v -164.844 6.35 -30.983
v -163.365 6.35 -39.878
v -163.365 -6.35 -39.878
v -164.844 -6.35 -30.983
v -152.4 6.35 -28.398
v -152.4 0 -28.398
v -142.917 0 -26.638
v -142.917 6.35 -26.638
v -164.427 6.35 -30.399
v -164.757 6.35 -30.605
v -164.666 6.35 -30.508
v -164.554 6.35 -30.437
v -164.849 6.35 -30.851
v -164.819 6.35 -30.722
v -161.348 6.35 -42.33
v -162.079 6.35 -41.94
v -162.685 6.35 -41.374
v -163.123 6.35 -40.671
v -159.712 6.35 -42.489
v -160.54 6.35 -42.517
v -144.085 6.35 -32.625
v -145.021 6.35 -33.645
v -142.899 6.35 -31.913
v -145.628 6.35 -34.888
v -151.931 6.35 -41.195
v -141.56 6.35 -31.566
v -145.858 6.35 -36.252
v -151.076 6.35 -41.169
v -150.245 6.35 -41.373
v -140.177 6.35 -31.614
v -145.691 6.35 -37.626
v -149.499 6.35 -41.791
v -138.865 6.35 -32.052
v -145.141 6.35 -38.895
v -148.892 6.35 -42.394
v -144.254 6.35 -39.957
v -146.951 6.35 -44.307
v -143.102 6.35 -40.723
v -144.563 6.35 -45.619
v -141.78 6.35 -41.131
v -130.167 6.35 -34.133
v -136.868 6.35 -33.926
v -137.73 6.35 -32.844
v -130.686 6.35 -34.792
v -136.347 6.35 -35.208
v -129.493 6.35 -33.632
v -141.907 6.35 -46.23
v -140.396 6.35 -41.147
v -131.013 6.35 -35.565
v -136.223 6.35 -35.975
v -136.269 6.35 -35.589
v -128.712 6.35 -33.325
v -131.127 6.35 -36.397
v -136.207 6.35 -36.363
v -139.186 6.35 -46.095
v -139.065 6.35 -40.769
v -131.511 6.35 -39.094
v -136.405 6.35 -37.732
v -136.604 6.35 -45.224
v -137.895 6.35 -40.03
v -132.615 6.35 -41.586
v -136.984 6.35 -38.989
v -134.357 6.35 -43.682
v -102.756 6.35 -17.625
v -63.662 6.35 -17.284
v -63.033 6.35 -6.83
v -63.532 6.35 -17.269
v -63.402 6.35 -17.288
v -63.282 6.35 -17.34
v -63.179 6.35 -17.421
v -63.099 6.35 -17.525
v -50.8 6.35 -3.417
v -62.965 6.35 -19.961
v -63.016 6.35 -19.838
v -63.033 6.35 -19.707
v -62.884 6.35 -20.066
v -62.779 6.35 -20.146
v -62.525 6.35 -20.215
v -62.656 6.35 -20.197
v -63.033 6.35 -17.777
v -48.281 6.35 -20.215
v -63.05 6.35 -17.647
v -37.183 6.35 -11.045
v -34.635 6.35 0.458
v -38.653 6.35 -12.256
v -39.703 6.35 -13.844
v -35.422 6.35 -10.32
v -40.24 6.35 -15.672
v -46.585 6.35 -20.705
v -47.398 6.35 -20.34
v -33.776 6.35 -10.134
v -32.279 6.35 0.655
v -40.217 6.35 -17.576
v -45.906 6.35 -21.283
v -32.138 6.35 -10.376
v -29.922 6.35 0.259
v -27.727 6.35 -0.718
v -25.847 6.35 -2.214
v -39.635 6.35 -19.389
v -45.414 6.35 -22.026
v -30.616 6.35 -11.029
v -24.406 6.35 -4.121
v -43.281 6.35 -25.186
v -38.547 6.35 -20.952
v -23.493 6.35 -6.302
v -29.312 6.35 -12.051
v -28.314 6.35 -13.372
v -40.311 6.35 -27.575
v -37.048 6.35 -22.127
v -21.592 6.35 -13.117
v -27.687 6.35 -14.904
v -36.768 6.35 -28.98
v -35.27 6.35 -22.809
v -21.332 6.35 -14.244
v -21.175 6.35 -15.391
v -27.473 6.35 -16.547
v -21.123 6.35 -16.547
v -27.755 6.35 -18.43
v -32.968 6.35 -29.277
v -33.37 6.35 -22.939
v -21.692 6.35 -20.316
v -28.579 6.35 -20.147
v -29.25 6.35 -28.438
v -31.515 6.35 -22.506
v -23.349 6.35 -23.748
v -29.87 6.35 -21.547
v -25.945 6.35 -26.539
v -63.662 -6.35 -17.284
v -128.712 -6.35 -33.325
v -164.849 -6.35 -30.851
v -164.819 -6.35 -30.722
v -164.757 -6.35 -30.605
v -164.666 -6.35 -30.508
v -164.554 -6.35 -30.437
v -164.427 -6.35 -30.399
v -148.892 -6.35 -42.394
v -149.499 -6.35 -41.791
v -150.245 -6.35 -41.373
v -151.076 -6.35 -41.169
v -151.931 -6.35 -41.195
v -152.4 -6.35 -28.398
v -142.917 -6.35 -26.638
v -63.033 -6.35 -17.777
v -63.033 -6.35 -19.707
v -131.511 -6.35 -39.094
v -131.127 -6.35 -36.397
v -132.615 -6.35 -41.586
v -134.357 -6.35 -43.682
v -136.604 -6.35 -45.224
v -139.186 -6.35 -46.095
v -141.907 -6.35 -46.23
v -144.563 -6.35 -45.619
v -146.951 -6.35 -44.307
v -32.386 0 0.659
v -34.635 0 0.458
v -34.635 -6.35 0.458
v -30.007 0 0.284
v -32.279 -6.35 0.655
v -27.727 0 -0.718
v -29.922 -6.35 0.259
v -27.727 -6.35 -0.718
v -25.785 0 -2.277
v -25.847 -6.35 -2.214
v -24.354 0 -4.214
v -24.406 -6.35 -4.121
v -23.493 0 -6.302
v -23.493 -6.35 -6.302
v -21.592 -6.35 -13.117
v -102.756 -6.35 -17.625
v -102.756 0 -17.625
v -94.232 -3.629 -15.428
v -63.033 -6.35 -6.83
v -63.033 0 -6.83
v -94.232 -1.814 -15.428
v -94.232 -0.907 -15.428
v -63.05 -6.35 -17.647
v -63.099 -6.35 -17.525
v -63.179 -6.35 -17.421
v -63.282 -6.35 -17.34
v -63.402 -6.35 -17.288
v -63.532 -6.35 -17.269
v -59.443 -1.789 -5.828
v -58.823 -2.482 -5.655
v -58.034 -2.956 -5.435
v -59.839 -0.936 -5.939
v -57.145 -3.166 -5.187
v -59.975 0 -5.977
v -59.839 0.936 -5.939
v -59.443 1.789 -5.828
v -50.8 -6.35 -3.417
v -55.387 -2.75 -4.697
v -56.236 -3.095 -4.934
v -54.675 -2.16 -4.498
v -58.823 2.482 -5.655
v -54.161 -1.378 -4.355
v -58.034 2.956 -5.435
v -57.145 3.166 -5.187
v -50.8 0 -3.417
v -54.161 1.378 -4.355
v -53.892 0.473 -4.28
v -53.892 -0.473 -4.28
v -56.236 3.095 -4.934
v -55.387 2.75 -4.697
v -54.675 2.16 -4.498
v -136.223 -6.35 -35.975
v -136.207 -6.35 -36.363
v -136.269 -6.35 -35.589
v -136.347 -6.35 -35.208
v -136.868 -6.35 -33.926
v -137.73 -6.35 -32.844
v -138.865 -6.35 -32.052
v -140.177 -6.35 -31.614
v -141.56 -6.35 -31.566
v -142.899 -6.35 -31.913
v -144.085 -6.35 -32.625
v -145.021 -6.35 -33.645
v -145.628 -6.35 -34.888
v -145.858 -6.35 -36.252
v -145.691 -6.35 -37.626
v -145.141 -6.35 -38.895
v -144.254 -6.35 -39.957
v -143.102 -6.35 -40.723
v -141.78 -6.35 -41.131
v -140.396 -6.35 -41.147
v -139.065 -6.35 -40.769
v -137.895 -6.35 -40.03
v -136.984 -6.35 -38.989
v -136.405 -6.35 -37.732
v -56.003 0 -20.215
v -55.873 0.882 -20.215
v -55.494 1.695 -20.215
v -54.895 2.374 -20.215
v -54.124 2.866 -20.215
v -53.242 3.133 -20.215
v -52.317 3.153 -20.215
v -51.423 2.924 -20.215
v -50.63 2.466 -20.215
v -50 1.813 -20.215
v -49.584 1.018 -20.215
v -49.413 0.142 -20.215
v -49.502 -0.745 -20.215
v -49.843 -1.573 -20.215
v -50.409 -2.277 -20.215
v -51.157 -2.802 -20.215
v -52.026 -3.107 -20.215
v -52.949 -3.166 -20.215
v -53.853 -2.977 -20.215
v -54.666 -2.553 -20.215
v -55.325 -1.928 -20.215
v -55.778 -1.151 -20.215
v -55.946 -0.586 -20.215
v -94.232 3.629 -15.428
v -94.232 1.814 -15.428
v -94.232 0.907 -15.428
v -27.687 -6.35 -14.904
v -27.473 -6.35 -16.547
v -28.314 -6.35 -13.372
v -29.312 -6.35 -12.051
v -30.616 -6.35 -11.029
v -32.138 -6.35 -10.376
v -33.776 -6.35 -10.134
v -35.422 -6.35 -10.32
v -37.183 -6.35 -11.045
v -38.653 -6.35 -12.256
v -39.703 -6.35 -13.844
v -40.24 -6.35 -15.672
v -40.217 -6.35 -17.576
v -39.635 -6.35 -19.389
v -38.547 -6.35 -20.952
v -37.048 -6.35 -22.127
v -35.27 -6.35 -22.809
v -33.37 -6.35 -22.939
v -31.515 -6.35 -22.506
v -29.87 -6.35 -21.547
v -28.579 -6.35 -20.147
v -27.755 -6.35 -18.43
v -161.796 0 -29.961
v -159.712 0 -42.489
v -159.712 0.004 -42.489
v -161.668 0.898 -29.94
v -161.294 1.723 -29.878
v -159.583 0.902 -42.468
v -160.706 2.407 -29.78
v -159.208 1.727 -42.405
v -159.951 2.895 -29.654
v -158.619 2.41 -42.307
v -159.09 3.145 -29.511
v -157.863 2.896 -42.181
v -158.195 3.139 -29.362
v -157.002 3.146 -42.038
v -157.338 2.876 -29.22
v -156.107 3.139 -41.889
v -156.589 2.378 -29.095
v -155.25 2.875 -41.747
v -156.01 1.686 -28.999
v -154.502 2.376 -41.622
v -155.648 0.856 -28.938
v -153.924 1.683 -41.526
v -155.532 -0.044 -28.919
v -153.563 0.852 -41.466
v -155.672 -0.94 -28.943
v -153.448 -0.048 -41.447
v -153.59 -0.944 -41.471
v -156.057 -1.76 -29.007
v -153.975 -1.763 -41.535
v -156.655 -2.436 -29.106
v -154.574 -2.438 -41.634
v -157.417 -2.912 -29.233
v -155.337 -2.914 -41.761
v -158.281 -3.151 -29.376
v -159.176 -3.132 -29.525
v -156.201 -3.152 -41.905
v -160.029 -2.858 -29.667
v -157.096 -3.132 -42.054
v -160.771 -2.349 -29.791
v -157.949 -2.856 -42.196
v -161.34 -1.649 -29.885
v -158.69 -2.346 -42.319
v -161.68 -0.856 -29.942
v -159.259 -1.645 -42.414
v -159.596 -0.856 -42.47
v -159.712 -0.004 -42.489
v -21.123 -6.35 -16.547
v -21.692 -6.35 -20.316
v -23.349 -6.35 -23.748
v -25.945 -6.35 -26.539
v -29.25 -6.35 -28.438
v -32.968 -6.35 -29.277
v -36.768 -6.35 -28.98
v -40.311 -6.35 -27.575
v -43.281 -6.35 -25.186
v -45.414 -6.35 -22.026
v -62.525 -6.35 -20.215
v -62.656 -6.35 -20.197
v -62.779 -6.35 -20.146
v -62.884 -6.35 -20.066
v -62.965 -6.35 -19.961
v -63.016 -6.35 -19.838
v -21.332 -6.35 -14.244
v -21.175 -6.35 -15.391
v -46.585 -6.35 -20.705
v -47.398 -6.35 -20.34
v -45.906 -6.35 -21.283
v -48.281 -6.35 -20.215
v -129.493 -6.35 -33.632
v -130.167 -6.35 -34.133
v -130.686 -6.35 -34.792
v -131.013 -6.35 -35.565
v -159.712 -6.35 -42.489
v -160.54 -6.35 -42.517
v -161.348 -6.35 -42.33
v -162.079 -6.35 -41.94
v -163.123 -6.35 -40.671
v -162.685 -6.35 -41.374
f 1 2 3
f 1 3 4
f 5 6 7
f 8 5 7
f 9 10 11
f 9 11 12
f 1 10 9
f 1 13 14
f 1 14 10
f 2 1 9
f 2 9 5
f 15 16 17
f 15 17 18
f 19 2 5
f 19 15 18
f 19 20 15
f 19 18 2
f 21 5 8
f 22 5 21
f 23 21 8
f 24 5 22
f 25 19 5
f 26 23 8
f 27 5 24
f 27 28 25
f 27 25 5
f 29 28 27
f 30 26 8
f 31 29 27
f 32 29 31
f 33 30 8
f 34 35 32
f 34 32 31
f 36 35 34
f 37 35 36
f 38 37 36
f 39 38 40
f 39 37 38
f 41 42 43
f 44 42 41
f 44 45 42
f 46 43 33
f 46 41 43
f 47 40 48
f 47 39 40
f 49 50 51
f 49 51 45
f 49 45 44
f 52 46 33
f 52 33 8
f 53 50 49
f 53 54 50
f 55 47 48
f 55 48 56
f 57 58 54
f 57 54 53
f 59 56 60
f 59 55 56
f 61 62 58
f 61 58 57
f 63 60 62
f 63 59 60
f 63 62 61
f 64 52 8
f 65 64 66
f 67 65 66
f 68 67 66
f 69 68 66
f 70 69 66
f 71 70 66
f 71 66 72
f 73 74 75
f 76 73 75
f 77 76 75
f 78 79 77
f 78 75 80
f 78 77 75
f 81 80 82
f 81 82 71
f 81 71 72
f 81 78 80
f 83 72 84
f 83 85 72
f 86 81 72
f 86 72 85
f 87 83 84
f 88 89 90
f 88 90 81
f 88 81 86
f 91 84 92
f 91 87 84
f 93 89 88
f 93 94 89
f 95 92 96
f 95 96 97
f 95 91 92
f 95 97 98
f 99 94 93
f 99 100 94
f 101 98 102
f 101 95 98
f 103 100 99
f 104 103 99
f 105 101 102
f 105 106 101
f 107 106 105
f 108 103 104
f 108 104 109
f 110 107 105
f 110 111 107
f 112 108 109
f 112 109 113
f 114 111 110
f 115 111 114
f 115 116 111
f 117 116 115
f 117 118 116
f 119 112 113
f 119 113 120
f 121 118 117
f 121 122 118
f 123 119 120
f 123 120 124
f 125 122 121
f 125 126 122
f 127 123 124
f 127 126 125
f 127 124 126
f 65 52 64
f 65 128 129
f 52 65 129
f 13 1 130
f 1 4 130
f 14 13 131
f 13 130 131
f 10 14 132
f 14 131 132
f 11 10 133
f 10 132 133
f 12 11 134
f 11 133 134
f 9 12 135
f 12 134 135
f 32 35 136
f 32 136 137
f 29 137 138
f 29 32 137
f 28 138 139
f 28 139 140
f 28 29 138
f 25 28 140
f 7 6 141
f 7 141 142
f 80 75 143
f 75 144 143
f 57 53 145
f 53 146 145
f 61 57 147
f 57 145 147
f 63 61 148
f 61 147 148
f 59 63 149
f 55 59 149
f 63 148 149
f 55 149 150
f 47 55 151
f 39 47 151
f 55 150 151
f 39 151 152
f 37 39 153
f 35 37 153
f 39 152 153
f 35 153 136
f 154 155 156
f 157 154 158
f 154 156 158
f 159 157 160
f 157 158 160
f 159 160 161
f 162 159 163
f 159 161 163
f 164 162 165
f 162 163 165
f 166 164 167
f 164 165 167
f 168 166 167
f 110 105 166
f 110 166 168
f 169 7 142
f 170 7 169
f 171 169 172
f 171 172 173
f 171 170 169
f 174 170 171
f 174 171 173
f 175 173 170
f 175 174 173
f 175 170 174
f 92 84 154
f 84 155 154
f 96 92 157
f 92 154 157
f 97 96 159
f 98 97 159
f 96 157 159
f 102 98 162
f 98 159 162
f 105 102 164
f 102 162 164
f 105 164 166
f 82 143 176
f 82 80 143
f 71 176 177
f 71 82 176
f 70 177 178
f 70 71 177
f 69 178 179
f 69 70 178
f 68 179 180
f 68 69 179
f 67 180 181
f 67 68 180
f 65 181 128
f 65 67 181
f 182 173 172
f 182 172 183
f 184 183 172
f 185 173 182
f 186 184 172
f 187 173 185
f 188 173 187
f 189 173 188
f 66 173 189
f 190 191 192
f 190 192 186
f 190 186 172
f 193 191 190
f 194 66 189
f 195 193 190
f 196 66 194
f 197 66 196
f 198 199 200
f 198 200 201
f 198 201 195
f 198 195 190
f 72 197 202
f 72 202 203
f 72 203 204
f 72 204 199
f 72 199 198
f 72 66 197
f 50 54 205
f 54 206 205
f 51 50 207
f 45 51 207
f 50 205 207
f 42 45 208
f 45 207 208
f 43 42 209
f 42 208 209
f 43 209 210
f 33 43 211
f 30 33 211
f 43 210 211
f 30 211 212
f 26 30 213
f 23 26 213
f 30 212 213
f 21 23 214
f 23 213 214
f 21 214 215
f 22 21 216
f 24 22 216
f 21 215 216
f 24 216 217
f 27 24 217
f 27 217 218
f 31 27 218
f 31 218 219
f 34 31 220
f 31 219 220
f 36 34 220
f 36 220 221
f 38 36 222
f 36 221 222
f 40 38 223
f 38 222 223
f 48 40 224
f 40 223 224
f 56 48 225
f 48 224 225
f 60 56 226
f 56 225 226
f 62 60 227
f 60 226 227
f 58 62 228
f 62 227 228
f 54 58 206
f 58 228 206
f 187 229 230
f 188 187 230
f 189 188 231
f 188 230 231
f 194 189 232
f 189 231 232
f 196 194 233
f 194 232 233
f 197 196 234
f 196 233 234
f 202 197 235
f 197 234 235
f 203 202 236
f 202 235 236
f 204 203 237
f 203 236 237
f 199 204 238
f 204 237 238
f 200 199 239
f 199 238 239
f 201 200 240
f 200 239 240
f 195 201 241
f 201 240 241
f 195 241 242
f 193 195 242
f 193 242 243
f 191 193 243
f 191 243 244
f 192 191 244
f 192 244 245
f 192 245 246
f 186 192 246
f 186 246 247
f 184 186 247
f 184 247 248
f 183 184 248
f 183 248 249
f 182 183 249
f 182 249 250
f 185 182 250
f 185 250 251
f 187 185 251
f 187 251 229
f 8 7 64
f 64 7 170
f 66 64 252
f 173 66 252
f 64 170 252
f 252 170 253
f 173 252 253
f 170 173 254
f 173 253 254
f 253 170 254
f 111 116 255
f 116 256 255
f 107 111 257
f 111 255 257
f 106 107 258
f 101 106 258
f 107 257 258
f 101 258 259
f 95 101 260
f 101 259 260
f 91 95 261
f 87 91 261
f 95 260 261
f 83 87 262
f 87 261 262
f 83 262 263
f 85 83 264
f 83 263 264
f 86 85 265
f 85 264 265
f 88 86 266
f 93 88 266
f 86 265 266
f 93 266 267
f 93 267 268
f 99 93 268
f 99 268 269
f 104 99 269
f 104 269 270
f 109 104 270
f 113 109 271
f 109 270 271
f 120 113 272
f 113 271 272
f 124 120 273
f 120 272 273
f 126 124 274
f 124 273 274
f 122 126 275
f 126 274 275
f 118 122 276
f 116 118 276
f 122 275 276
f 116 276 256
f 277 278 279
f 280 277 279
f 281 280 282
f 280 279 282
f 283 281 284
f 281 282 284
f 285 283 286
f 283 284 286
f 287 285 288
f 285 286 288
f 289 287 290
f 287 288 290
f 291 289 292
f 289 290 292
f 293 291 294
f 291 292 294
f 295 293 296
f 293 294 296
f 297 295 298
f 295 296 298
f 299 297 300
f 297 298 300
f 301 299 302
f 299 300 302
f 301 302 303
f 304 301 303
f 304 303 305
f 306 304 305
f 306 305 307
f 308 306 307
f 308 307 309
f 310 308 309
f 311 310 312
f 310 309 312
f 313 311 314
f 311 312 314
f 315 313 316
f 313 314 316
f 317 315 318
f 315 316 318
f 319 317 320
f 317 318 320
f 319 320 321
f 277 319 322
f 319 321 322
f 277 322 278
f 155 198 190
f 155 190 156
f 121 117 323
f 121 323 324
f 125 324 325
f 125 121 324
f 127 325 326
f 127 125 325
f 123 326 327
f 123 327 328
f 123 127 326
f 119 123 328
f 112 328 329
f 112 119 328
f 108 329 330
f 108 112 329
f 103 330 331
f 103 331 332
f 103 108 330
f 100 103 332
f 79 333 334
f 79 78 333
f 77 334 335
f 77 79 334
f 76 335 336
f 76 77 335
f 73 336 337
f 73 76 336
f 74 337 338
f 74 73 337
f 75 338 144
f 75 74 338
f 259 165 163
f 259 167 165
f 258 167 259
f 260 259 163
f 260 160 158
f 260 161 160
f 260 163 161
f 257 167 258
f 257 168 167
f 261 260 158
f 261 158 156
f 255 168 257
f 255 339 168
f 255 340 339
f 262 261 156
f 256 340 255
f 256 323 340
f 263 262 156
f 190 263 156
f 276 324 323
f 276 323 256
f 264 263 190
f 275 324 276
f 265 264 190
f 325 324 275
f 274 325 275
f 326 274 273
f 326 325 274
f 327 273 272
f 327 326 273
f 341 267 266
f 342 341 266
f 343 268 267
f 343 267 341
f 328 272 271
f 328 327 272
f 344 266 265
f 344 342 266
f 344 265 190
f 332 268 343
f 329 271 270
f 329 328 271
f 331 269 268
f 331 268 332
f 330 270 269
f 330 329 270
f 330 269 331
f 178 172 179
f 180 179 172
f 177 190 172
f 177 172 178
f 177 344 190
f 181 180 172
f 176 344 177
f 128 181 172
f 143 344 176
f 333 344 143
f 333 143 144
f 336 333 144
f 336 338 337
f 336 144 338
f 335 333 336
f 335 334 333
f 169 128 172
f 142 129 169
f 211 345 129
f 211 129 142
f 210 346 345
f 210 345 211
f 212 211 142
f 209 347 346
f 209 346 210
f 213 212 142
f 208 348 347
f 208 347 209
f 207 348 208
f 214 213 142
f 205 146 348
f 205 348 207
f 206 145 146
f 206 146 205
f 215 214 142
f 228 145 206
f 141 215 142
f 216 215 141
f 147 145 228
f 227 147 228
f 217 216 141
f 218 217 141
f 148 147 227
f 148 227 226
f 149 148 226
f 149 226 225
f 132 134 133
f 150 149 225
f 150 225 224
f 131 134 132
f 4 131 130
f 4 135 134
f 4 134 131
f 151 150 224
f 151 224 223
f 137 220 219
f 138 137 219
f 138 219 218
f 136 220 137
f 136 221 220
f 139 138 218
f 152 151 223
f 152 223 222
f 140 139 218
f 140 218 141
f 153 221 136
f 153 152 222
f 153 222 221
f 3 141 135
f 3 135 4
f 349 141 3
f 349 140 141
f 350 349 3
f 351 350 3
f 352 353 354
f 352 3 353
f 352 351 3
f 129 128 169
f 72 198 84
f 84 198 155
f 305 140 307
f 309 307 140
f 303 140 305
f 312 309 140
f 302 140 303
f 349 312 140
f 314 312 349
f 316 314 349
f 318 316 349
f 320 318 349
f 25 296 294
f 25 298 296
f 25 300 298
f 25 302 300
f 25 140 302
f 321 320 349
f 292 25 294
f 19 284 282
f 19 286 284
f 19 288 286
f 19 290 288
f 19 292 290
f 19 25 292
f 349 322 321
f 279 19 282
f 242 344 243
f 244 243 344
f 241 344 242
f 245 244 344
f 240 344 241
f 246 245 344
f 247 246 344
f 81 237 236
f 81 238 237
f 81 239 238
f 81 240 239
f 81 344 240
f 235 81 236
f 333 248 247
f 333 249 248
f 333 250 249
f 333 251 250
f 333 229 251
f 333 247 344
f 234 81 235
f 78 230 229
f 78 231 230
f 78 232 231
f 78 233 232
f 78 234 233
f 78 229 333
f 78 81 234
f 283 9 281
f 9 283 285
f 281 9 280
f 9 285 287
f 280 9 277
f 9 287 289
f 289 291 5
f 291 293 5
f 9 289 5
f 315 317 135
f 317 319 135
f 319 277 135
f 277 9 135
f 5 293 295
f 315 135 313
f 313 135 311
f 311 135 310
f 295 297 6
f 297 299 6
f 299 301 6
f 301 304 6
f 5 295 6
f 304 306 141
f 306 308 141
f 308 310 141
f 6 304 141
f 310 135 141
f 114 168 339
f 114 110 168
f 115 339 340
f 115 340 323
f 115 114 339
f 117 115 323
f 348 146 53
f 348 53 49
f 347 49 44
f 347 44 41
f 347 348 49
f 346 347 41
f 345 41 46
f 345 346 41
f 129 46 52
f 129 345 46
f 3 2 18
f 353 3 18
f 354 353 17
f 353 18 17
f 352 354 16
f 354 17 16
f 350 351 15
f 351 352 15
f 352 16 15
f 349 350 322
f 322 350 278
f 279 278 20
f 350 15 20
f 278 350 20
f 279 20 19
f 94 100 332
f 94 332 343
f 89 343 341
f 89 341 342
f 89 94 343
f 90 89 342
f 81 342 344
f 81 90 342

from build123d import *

# Parameters (mm, degrees)
BOSS_EXTRUDE1_DEPTH                   = 6.35
FILLET1_R                             = 3.175
FILLET4_R                             = 0.508
F_1_4_0_25_DIAMETER_HOLE1_D           = 6.35
F_1_4_0_25_DIAMETER_HOLE1_ON_FACE_2_D = 6.35
FILLET8_R                             = 9.525


with BuildPart() as part:
    # Sketch1 → Boss-Extrude1 (new, symmetric)
    # profile 1 of 13: a face of its own
    with BuildSketch(Plane(origin=(0, 0, 0), x_dir=(1, 0, 0), z_dir=(0, 1, 0))):
        Polygon((-63.032869919, 6.829847883), (-50.8, 3.417093343), (-50.117449092, 5.863667327), (-48.008399772, 13.423462702), (-63.032869919, 17.128450878), align=None)
    # profile 2 of 13: a face of its own
    with BuildSketch(Plane(origin=(0, 0, 0), x_dir=(1, 0, 0), z_dir=(0, 1, 0))):
        with BuildLine():
            Line((-50.117449092, 5.863667327), (-50.8, 3.417093343))
            add(Edge.make_bspline(
                [(-50.8, 3.417093343), (-47.90401251, 2.638759622), (-42.323161066, 1.207315918), (-34.243320379, -0.564459364), (-28.828072067, -1.650873486), (-26.114874946, -2.164171794), (-25.868230414, -2.21056185)],
                knots=[0.402881469, 0.402881469, 0.402881469, 0.402881469, 0.417195876, 0.430379519, 0.442362633, 0.443560626, 0.443560626, 0.443560626, 0.443560626], degree=3))
            Line((-25.868230414, -2.21056185), (-25.529380555, -0.995969297))
            Line((-25.529380555, -0.995969297), (-50.117449092, 5.863667327))
        make_face()
    # profile 3 of 13: a face of its own
    with BuildSketch(Plane(origin=(0, 0, 0), x_dir=(1, 0, 0), z_dir=(0, 1, 0))):
        with BuildLine():
            add(Edge.make_bspline(
                [(-142.916964795, 26.637840254), (-139.851770269, 26.044031657), (-132.224118107, 24.507766264), (-120.204077857, 21.875031645), (-107.039843971, 18.731571582), (-94.42881917, 15.508074422), (-82.464130524, 12.283599717), (-72.07374601, 9.383281264), (-65.6770572, 7.577167824), (-63.032869919, 6.829847883)],
                knots=[0.2516695, 0.2516695, 0.2516695, 0.2516695, 0.266573311, 0.288810349, 0.310405036, 0.331177743, 0.350943876, 0.3695564, 0.382673151, 0.382673151, 0.382673151, 0.382673151], degree=3))
            Line((-63.032869919, 6.829847883), (-63.032869919, 17.128450878))
            Line((-63.032869919, 17.128450878), (-131.41505653, 33.991287994))
            ThreePointArc((-131.41505653, 33.991287994), (-135.697076354, 28.016927932), (-142.916964795, 26.637840254))
        make_face()
    # profile 4 of 13: a face of its own
    with BuildSketch(Plane(origin=(0, 0, 0), x_dir=(1, 0, 0), z_dir=(0, 1, 0))):
        with BuildLine():
            Line((-48.008399772, 13.423462702), (-50.117449092, 5.863667327))
            Line((-50.117449092, 5.863667327), (-25.529380555, -0.995969297))
            Line((-25.529380555, -0.995969297), (-21.592172885, 13.116780012))
            ThreePointArc((-21.592172885, 13.116780012), (-33.805570634, 3.783353047), (-46.135923457, 12.961715796))
            Line((-46.135923457, 12.961715796), (-48.008399772, 13.423462702))
        make_face()
    # profile 5 of 13: a face of its own
    with BuildSketch(Plane(origin=(0, 0, 0), x_dir=(1, 0, 0), z_dir=(0, 1, 0))):
        Polygon((-63.032869919, 20.214556587), (-63.032869919, 17.128450878), (-48.008399772, 13.423462702), (-46.180241275, 19.976417164), (-46.113804584, 20.214556587), align=None)
    # profile 6 of 13: a face of its own
    with BuildSketch(Plane(origin=(0, 0, 0), x_dir=(1, 0, 0), z_dir=(0, 1, 0))):
        with BuildLine():
            add(Edge.make_bspline(
                [(-152.4, 28.398178215), (-150.835767653, 28.120675984), (-147.672379647, 27.546477658), (-144.513670254, 26.947163992), (-142.916964795, 26.637840254)],
                knots=[0.236322429, 0.236322429, 0.236322429, 0.236322429, 0.243905882, 0.2516695, 0.2516695, 0.2516695, 0.2516695], degree=3))
            ThreePointArc((-142.916964795, 26.637840254), (-149.167660925, 30.710139705), (-150.804662589, 37.988535853))
            Line((-150.804662589, 37.988535853), (-152.4, 28.398178215))
        make_face()
    # profile 7 of 13: a face of its own
    with BuildSketch(Plane(origin=(0, 0, 0), x_dir=(1, 0, 0), z_dir=(0, 1, 0))):
        with BuildLine():
            ThreePointArc((-150.804662589, 37.988535853), (-149.167660925, 30.710139705), (-142.916964795, 26.637840254))
            ThreePointArc((-142.916964795, 26.637840254), (-135.697076354, 28.016927932), (-131.41505653, 33.991287994))
            ThreePointArc((-131.41505653, 33.991287994), (-131.199232943, 35.168440277), (-131.126940024, 36.363028513))
            ThreePointArc((-131.126940024, 36.363028513), (-138.72556699, 45.996556718), (-149.864041918, 40.850842606))
            ThreePointArc((-149.864041918, 40.850842606), (-150.443809774, 39.45565952), (-150.804662589, 37.988535853))
        make_face()
        with BuildLine():
            ThreePointArc((-136.206940024, 36.363028513), (-136.242159651, 35.781049629), (-136.347304475, 35.207565183))
            ThreePointArc((-136.347304475, 35.207565183), (-145.823720397, 36.945007397), (-136.206940024, 36.363028513))
        make_face(mode=Mode.SUBTRACT)
    # profile 8 of 13: a face of its own
    with BuildSketch(Plane(origin=(0, 0, 0), x_dir=(1, 0, 0), z_dir=(0, 1, 0))):
        with BuildLine():
            Line((-46.180241275, 19.976417164), (-48.008399772, 13.423462702))
            Line((-48.008399772, 13.423462702), (-46.135923457, 12.961715796))
            ThreePointArc((-46.135923457, 12.961715796), (-46.649452433, 16.465962078), (-46.180241275, 19.976417164))
        make_face()
    # profile 9 of 13: a face of its own
    with BuildSketch(Plane(origin=(0, 0, 0), x_dir=(1, 0, 0), z_dir=(0, 1, 0))):
        with BuildLine():
            Line((-152.4, 28.398178215), (-150.804662589, 37.988535853))
            Line((-150.804662589, 37.988535853), (-150.316016511, 40.926027704))
            Line((-150.316016511, 40.926027704), (-162.843866, 43.010011192))
            Line((-162.843866, 43.010011192), (-164.927849489, 30.482161703))
            add(Edge.make_bspline(
                [(-164.927849489, 30.482161703), (-163.914067431, 30.324847033), (-159.732455899, 29.664434578), (-155.558182899, 28.958454826), (-152.4, 28.398178215)],
                knots=[0.216114261, 0.216114261, 0.216114261, 0.216114261, 0.221011446, 0.236322429, 0.236322429, 0.236322429, 0.236322429], degree=3))
        make_face()
    # profile 10 of 13: a face of its own
    with BuildSketch(Plane(origin=(0, 0, 0), x_dir=(1, 0, 0), z_dir=(0, 1, 0))):
        with BuildLine():
            Line((-150.316016511, 40.926027704), (-150.804662589, 37.988535853))
            ThreePointArc((-150.804662589, 37.988535853), (-150.443809774, 39.45565952), (-149.864041918, 40.850842606))
            Line((-149.864041918, 40.850842606), (-150.316016511, 40.926027704))
        make_face()
    # profile 11 of 13: a face of its own
    with BuildSketch(Plane(origin=(0, 0, 0), x_dir=(1, 0, 0), z_dir=(0, 1, 0))):
        with BuildLine():
            Line((-164.927849489, 30.482161703), (-152.4, 28.398178215))
            add(Edge.make_bspline(
                [(-164.927849489, 30.482161703), (-163.914067431, 30.324847033), (-159.732455899, 29.664434578), (-155.558182899, 28.958454826), (-152.4, 28.398178215)],
                knots=[0.216114261, 0.216114261, 0.216114261, 0.216114261, 0.221011446, 0.236322429, 0.236322429, 0.236322429, 0.236322429], degree=3))
        make_face()
    # profile 12 of 13: a face of its own
    with BuildSketch(Plane(origin=(0, 0, 0), x_dir=(1, 0, 0), z_dir=(0, 1, 0))):
        with BuildLine():
            Line((-46.113804584, 20.214556587), (-46.180241275, 19.976417164))
            ThreePointArc((-46.180241275, 19.976417164), (-46.14635129, 20.095654256), (-46.111304881, 20.214556587))
            Line((-46.111304881, 20.214556587), (-46.113804584, 20.214556587))
        make_face()
    # profile 13 of 13: a face of its own
    with BuildSketch(Plane(origin=(0, 0, 0), x_dir=(1, 0, 0), z_dir=(0, 1, 0))):
        with BuildLine():
            ThreePointArc((-46.111304881, 20.214556587), (-46.14635129, 20.095654256), (-46.180241275, 19.976417164))
            ThreePointArc((-46.180241275, 19.976417164), (-46.649452433, 16.465962078), (-46.135923457, 12.961715796))
            ThreePointArc((-46.135923457, 12.961715796), (-33.805570634, 3.783353047), (-21.592172885, 13.116780012))
            ThreePointArc((-21.592172885, 13.116780012), (-21.240618227, 14.815698867), (-21.122707154, 16.546598324))
            ThreePointArc((-21.122707154, 16.546598324), (-32.032575932, 29.17478044), (-46.111304881, 20.214556587))
        make_face()
        with BuildLine():
            ThreePointArc((-27.472707154, 16.546598324), (-29.931164004, 11.497775102), (-35.421757105, 10.319635293))
            ThreePointArc((-35.421757105, 10.319635293), (-37.841250304, 21.595421547), (-27.472707154, 16.546598324))
        make_face(mode=Mode.SUBTRACT)
    extrude(amount=BOSS_EXTRUDE1_DEPTH, both=True)

    # Fillet1
    # the kernel refuses this fillet: 3.175 mm, written as the material it adds along each edge
    with BuildSketch(Plane(origin=(-149.864041918, 6.35, -40.850842606), x_dir=(0.5331827682272952, 0, -0.8460000801805391), z_dir=(0, -1, 0))) as fillet1_piece_1:
        with BuildLine():
            CenterArc((2.116076272, -3.161518606), FILLET1_R, 95.281860793, 61.941944222)
            Line((-0.811350167, -1.932372788), (0, 0))
            ThreePointArc((0, 0), (0.911900272, -0.042061948), (1.823800544, 0))
        make_face()
    extrude(amount=12.7)
    with BuildSketch(Plane(origin=(-131.41505653, -6.35, -33.991287994), x_dir=(0.9709149499625199, 0, 0.23942464355048618), z_dir=(0, 1, 0))) as fillet1_piece_2:
        with BuildLine():
            CenterArc((2.783835933, 3.175), FILLET1_R, 194.047041006, 75.952958994)
            ThreePointArc((-0.296221332, 2.404368932), (-0.074334234, 1.211273817), (0, 0))
            Line((0, 0), (2.783835933, 0))
        make_face()
    extrude(amount=12.7)
    with BuildSketch(Plane(origin=(-46.111304881, 6.35, -20.214556587), x_dir=(-1, 0, 0), z_dir=(0, -1, 0)), Plane(origin=(-46.111304881, 0, -20.214556587), x_dir=(-1, 0, 0), z_dir=(0, -1, 0))) as fillet1_piece_3:
        with BuildLine():
            CenterArc((2.169682732, 3.175), FILLET1_R, 205.425374389, 64.574625611)
            ThreePointArc((-0.697803415, 1.811860904), (-0.314399096, 0.91921847), (0, 0))
            Line((0, 0), (2.169682732, 0))
        make_face()
    extrude(amount=6.35)
    # the kernel refuses this fillet: 3.175 mm, written as the material it takes off along each edge
    with BuildSketch(Plane(origin=(-162.843866, 14.2875, -43.010011192), x_dir=(-0.16409318808875556, 0, 0.9864448416525216), z_dir=(0, -1, 0))) as fillet1_2_piece_1:
        with BuildLine():
            CenterArc((FILLET1_R, -FILLET1_R), FILLET1_R, 90, 90)
            Line((0, -FILLET1_R), (0, 0))
            Line((0, 0), (FILLET1_R, 0))
        make_face()
    extrude(amount=28.575, mode=Mode.SUBTRACT)

    # Fillet4
    fillet4_edges = [part.edges().sort_by_distance(p)[0] for p in [
        (-164.927849489, 0, -30.482161703),
        (-63.032869919, 0, -17.128450878),
        (-63.032869919, 0, -20.214556587),
    ]]
    fillet(fillet4_edges, radius=FILLET4_R)

    # 1/4 (0.25) Diameter Hole1 (through all)
    with Locations(Plane(origin=(-56.916434959, 0, -5.123470613), x_dir=(0.963218103856, 0, 0.268720829868), z_dir=(-0.268720829868, 0, 0.963218103856))):
        with Locations((0, 0)):
            Hole(F_1_4_0_25_DIAMETER_HOLE1_D / 2)

    # 1/4 (0.25) Diameter Hole1 on face 2 (through all)
    with Locations(Plane(origin=(-158.663924744, 0, -29.440169959), x_dir=(0.986444876362, 0, 0.164092979433), z_dir=(-0.164092979433, 0, 0.986444876362))):
        with Locations((0, 0)):
            Hole(F_1_4_0_25_DIAMETER_HOLE1_ON_FACE_2_D / 2)

    # Fillet8
    fillet8_edges = [part.edges().sort_by_distance(p)[0] for p in [
        (-25.868230414, -3.175, 2.21056185),
    ]]
    fillet(fillet8_edges, radius=FILLET8_R)


solid = part.part
